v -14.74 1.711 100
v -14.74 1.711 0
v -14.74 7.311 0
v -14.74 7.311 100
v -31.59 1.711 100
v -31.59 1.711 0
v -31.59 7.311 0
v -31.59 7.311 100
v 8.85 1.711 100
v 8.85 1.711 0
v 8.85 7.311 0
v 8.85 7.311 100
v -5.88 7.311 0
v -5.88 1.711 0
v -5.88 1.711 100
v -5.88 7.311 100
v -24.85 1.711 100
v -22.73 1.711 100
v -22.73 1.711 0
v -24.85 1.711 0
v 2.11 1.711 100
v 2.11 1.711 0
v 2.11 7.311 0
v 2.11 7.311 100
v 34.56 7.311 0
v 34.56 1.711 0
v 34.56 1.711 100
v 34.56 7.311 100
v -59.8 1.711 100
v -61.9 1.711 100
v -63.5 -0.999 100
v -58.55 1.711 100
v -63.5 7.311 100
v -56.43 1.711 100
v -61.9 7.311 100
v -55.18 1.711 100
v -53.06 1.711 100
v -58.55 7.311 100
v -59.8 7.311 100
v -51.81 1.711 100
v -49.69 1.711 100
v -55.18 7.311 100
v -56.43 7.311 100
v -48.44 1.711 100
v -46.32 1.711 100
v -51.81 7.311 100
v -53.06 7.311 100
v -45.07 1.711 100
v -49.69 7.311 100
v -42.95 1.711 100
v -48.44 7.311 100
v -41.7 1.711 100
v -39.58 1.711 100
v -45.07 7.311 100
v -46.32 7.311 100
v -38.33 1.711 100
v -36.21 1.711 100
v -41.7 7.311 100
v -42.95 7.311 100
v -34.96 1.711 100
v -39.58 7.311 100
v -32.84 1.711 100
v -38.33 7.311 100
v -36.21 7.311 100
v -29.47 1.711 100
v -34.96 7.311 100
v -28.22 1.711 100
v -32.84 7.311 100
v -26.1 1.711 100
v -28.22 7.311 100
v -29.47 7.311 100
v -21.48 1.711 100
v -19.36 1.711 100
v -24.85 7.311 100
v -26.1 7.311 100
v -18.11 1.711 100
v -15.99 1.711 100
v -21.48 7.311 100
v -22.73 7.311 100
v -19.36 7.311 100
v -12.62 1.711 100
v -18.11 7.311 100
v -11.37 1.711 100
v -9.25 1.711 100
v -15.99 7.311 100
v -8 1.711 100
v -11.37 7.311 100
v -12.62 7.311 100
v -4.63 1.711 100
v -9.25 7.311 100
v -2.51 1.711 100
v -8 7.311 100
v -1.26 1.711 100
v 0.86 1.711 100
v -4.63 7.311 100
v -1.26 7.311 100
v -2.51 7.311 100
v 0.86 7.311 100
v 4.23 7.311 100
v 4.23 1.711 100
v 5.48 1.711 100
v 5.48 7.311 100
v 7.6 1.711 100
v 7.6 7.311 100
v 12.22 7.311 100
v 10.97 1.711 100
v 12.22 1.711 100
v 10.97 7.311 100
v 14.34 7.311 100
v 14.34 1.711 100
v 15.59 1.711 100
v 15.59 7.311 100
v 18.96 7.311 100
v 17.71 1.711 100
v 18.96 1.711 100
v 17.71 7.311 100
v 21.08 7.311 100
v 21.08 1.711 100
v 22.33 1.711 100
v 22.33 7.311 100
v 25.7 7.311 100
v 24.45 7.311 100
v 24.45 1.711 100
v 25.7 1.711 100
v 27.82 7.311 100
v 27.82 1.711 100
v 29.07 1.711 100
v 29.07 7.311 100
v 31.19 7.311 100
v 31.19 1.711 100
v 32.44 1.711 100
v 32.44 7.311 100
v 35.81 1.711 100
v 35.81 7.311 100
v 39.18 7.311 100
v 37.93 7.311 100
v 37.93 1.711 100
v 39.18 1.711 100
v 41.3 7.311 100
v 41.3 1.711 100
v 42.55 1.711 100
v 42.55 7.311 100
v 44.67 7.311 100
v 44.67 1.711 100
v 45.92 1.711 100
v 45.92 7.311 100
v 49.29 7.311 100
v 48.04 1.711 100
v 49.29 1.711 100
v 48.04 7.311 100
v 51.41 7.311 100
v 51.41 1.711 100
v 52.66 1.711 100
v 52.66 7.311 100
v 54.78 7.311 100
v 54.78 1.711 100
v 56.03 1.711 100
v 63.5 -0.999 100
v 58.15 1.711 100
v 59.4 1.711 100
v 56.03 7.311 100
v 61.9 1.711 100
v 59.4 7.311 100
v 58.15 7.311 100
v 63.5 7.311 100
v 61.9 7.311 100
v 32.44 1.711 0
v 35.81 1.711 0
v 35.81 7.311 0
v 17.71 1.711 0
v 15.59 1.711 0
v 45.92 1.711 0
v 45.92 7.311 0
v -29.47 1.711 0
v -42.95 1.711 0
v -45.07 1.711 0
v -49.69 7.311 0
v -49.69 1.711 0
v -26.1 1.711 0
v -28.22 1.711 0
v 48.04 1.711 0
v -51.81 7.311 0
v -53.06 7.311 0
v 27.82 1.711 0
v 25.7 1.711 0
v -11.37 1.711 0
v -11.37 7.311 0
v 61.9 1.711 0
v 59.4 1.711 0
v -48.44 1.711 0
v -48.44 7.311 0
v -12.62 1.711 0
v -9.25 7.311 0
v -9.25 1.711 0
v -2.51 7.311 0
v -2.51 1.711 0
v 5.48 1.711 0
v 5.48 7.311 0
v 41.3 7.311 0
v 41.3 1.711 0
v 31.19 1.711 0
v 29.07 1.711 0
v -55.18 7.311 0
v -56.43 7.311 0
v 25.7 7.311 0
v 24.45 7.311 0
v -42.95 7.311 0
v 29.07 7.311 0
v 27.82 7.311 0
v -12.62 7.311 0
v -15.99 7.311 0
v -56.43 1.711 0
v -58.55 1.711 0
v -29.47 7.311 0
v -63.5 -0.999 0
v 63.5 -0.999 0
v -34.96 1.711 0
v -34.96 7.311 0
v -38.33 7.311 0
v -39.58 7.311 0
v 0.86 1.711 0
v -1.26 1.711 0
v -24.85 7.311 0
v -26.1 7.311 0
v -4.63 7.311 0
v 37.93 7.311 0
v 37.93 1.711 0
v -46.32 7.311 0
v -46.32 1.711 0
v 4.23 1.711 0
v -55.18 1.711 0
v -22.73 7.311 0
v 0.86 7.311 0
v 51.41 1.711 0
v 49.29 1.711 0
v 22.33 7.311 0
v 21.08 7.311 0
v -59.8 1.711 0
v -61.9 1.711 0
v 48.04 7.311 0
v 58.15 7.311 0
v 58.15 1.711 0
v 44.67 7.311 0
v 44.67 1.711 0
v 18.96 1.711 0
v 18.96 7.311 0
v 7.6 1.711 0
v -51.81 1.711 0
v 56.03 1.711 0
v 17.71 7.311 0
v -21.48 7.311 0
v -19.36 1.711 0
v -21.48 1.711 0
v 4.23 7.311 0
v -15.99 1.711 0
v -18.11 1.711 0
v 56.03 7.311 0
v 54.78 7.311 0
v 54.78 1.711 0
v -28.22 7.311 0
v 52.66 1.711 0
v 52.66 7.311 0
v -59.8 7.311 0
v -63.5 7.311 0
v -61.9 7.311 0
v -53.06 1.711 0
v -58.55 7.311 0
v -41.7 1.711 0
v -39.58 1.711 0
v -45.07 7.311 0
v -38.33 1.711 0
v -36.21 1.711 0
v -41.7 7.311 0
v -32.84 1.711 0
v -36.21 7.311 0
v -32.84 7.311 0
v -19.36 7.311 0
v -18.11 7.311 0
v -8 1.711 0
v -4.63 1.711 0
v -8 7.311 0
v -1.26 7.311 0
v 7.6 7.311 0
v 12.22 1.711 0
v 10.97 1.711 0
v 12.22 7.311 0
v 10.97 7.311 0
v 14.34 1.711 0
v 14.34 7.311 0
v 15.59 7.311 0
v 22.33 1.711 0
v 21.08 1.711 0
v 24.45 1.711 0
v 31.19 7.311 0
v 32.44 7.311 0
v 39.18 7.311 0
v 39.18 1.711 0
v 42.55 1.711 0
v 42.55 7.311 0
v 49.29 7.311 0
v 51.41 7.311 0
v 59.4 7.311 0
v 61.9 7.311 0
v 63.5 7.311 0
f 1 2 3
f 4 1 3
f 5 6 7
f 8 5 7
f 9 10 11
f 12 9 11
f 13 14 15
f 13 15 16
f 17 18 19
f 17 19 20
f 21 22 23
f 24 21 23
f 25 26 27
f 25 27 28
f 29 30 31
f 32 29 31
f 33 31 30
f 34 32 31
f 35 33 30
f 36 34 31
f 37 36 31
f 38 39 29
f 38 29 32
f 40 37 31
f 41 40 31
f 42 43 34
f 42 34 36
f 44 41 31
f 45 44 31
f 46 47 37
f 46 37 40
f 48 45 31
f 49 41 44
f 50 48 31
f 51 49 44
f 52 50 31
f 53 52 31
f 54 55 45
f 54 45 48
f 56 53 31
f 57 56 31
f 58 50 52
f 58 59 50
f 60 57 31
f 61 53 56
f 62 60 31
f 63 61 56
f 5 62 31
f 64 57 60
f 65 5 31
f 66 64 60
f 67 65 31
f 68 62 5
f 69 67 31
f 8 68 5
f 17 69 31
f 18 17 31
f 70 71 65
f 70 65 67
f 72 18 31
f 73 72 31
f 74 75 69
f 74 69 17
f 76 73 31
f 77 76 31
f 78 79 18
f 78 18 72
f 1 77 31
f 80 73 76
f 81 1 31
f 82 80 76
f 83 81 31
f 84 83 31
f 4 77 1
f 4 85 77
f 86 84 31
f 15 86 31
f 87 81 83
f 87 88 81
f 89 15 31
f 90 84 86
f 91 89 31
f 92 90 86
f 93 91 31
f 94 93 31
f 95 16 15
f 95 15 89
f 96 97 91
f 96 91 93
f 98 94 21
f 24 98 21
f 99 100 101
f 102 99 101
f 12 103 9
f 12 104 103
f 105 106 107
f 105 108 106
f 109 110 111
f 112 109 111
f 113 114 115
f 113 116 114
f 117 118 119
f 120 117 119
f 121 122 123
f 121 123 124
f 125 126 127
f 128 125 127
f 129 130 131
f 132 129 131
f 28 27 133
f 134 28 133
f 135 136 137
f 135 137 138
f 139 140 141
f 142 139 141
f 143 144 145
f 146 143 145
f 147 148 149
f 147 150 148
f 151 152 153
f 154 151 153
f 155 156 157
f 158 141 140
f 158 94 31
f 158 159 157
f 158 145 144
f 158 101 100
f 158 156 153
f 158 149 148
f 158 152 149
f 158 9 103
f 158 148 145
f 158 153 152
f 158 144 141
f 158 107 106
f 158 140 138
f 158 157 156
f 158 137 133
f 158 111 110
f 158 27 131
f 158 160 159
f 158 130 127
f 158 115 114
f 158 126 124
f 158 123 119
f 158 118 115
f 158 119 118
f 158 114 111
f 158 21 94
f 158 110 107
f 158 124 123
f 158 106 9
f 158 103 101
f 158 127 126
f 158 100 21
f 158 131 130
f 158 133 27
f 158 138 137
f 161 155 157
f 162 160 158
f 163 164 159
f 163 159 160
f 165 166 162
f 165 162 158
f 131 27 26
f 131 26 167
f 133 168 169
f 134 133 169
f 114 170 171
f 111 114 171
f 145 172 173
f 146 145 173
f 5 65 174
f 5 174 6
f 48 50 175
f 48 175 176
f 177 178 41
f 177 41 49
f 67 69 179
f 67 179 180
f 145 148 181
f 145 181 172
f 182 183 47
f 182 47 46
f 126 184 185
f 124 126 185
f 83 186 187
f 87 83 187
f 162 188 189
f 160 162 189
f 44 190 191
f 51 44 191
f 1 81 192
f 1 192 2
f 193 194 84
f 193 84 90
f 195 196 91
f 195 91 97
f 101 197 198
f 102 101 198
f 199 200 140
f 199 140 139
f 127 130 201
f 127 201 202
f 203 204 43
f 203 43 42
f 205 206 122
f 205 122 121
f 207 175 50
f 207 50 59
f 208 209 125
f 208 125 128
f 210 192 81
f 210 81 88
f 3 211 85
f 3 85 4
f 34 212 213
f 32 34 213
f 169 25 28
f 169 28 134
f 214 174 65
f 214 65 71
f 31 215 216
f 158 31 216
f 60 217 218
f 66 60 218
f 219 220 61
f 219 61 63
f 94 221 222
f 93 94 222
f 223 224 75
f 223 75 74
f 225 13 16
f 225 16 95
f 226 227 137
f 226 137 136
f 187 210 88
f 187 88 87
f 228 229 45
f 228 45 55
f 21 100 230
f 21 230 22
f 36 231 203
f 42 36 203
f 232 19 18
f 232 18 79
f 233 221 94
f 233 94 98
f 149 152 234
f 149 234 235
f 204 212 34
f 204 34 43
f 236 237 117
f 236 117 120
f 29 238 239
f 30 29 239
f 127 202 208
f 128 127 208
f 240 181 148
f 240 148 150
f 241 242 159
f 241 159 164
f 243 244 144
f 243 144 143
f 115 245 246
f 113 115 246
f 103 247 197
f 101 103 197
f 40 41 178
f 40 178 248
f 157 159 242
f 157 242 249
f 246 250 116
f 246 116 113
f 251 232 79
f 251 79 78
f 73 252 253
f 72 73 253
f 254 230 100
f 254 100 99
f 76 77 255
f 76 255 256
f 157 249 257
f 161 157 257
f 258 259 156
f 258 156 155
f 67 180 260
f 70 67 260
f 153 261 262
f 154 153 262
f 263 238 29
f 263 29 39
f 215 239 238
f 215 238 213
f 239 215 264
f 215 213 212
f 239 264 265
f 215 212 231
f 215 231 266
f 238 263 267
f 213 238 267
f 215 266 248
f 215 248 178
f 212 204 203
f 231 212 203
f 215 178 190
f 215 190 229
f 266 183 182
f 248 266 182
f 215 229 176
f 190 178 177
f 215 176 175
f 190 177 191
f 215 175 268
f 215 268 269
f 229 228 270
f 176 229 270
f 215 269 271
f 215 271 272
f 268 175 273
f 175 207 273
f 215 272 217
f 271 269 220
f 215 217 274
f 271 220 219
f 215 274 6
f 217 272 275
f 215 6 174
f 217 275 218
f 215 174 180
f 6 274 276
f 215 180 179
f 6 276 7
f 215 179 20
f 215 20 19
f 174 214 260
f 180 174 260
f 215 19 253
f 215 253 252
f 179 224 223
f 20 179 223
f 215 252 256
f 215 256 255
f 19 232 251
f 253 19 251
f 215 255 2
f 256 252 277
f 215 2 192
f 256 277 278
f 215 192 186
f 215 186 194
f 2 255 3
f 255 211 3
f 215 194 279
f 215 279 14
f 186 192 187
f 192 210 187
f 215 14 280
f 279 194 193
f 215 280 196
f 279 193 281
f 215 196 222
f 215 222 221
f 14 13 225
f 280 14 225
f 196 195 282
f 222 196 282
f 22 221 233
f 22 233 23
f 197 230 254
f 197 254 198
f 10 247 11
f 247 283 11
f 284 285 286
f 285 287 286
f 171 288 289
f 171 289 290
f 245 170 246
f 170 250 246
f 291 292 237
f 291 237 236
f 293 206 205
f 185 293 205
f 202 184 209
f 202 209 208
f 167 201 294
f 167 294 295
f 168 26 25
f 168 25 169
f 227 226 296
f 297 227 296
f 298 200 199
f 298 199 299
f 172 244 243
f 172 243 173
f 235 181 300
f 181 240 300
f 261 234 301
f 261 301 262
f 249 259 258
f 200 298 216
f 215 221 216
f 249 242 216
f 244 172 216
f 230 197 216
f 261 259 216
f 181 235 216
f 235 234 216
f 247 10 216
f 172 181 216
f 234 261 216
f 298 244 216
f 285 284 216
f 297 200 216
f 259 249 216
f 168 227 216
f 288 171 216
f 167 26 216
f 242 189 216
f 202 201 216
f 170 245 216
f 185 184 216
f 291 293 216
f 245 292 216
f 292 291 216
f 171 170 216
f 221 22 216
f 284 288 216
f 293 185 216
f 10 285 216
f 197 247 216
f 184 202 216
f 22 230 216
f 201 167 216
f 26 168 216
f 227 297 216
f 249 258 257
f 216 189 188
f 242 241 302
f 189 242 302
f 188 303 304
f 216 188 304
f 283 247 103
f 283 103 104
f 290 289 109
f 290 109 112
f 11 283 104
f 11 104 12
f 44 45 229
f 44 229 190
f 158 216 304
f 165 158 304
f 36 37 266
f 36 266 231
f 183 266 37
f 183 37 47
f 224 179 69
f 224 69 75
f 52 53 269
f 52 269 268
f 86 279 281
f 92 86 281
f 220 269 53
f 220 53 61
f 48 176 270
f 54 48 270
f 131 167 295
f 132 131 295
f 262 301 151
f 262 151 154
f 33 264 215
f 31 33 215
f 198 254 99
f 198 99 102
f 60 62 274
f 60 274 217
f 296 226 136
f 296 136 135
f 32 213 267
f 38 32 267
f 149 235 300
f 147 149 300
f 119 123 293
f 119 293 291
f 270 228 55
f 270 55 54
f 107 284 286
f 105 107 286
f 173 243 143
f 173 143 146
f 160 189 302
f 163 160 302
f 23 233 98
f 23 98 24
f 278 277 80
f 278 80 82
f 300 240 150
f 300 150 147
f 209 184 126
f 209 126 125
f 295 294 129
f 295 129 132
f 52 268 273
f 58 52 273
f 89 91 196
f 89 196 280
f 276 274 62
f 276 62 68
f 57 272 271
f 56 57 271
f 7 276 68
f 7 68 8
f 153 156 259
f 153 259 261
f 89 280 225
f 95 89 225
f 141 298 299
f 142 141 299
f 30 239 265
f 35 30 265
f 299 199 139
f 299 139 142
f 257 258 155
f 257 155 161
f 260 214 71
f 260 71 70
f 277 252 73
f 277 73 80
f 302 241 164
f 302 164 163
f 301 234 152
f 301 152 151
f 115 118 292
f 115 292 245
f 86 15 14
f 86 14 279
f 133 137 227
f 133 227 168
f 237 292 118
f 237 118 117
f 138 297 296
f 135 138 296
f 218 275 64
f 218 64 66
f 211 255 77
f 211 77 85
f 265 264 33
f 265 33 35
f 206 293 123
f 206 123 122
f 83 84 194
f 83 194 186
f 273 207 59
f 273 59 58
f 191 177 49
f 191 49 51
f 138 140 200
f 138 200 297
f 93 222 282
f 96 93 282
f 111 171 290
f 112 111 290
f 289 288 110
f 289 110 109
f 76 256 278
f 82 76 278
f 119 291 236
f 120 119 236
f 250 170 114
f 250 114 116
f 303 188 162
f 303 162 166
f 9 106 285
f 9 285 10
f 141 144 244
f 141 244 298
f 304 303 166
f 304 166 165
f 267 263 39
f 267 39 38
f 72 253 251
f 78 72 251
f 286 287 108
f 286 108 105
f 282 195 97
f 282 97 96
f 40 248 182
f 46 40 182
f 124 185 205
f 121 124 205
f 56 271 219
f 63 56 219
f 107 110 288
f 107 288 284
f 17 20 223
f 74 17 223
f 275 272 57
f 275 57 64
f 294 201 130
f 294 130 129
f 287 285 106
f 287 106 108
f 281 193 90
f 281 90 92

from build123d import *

# Parameters (mm, degrees)
SKETCH_1_W      = 1.6
SKETCH_1_H      = 5.6
SKETCH_1_W_2    = 1.25
EXTRUDE_1_DEPTH = 100


with BuildPart() as part:
    # 草图1 → 凸台-拉伸1 (new body)
    with BuildSketch(Plane.XY):
        Polygon((-63.5, 1.710790235), (-63.5, -0.999209765), (63.5, -0.999209765), (63.5, 1.710790235), (61.9, 1.710790235), (59.4, 1.710790235), (58.15, 1.710790235), (56.03, 1.710790235), (54.78, 1.710790235), (52.66, 1.710790235), (51.41, 1.710790235), (49.29, 1.710790235), (48.04, 1.710790235), (45.92, 1.710790235), (44.67, 1.710790235), (42.55, 1.710790235), (41.3, 1.710790235), (39.18, 1.710790235), (37.93, 1.710790235), (35.81, 1.710790235), (34.56, 1.710790235), (32.44, 1.710790235), (31.19, 1.710790235), (29.07, 1.710790235), (27.82, 1.710790235), (25.7, 1.710790235), (24.45, 1.710790235), (22.33, 1.710790235), (21.08, 1.710790235), (18.96, 1.710790235), (17.71, 1.710790235), (15.59, 1.710790235), (14.34, 1.710790235), (12.22, 1.710790235), (10.97, 1.710790235), (8.85, 1.710790235), (7.6, 1.710790235), (5.48, 1.710790235), (4.23, 1.710790235), (2.11, 1.710790235), (0.86, 1.710790235), (-1.26, 1.710790235), (-2.51, 1.710790235), (-4.63, 1.710790235), (-5.88, 1.710790235), (-8, 1.710790235), (-9.25, 1.710790235), (-11.37, 1.710790235), (-12.62, 1.710790235), (-14.74, 1.710790235), (-15.99, 1.710790235), (-18.11, 1.710790235), (-19.36, 1.710790235), (-21.48, 1.710790235), (-22.73, 1.710790235), (-24.85, 1.710790235), (-26.1, 1.710790235), (-28.22, 1.710790235), (-29.47, 1.710790235), (-31.59, 1.710790235), (-32.84, 1.710790235), (-34.96, 1.710790235), (-36.21, 1.710790235), (-38.33, 1.710790235), (-39.58, 1.710790235), (-41.7, 1.710790235), (-42.95, 1.710790235), (-45.07, 1.710790235), (-46.32, 1.710790235), (-48.44, 1.710790235), (-49.69, 1.710790235), (-51.81, 1.710790235), (-53.06, 1.710790235), (-55.18, 1.710790235), (-56.43, 1.710790235), (-58.55, 1.710790235), (-59.8, 1.710790235), (-61.9, 1.710790235), align=None)
        with Locations((-62.7, 4.510790235)):
            Rectangle(SKETCH_1_W, SKETCH_1_H)
        with Locations((62.7, 4.510790235)):
            Rectangle(SKETCH_1_W, SKETCH_1_H)
        with Locations((-59.175, 4.510790235)):
            Rectangle(SKETCH_1_W_2, SKETCH_1_H)
        with Locations((58.775, 4.510790235)):
            Rectangle(SKETCH_1_W_2, SKETCH_1_H)
        with Locations((-55.805, 4.510790235)):
            Rectangle(SKETCH_1_W_2, SKETCH_1_H)
        with Locations((55.405, 4.510790235)):
            Rectangle(SKETCH_1_W_2, SKETCH_1_H)
        with Locations((-52.435, 4.510790235)):
            Rectangle(SKETCH_1_W_2, SKETCH_1_H)
        with Locations((52.035, 4.510790235)):
            Rectangle(SKETCH_1_W_2, SKETCH_1_H)
        with Locations((-49.065, 4.510790235)):
            Rectangle(SKETCH_1_W_2, SKETCH_1_H)
        with Locations((48.665, 4.510790235)):
            Rectangle(SKETCH_1_W_2, SKETCH_1_H)
        with Locations((-45.695, 4.510790235)):
            Rectangle(SKETCH_1_W_2, SKETCH_1_H)
        with Locations((45.295, 4.510790235)):
            Rectangle(SKETCH_1_W_2, SKETCH_1_H)
        with Locations((-42.325, 4.510790235)):
            Rectangle(SKETCH_1_W_2, SKETCH_1_H)
        with Locations((41.925, 4.510790235)):
            Rectangle(SKETCH_1_W_2, SKETCH_1_H)
        with Locations((-38.955, 4.510790235)):
            Rectangle(SKETCH_1_W_2, SKETCH_1_H)
        with Locations((38.555, 4.510790235)):
            Rectangle(SKETCH_1_W_2, SKETCH_1_H)
        with Locations((-35.585, 4.510790235)):
            Rectangle(SKETCH_1_W_2, SKETCH_1_H)
        with Locations((35.185, 4.510790235)):
            Rectangle(SKETCH_1_W_2, SKETCH_1_H)
        with Locations((-32.215, 4.510790235)):
            Rectangle(SKETCH_1_W_2, SKETCH_1_H)
        with Locations((31.815, 4.510790235)):
            Rectangle(SKETCH_1_W_2, SKETCH_1_H)
        with Locations((-28.845, 4.510790235)):
            Rectangle(SKETCH_1_W_2, SKETCH_1_H)
        with Locations((28.445, 4.510790235)):
            Rectangle(SKETCH_1_W_2, SKETCH_1_H)
        with Locations((-25.475, 4.510790235)):
            Rectangle(SKETCH_1_W_2, SKETCH_1_H)
        with Locations((25.075, 4.510790235)):
            Rectangle(SKETCH_1_W_2, SKETCH_1_H)
        with Locations((-22.105, 4.510790235)):
            Rectangle(SKETCH_1_W_2, SKETCH_1_H)
        with Locations((21.705, 4.510790235)):
            Rectangle(SKETCH_1_W_2, SKETCH_1_H)
        with Locations((-18.735, 4.510790235)):
            Rectangle(SKETCH_1_W_2, SKETCH_1_H)
        with Locations((18.335, 4.510790235)):
            Rectangle(SKETCH_1_W_2, SKETCH_1_H)
        with Locations((-15.365, 4.510790235)):
            Rectangle(SKETCH_1_W_2, SKETCH_1_H)
        with Locations((14.965, 4.510790235)):
            Rectangle(SKETCH_1_W_2, SKETCH_1_H)
        with Locations((-11.995, 4.510790235)):
            Rectangle(SKETCH_1_W_2, SKETCH_1_H)
        with Locations((11.595, 4.510790235)):
            Rectangle(SKETCH_1_W_2, SKETCH_1_H)
        with Locations((-8.625, 4.510790235)):
            Rectangle(SKETCH_1_W_2, SKETCH_1_H)
        with Locations((8.225, 4.510790235)):
            Rectangle(SKETCH_1_W_2, SKETCH_1_H)
        with Locations((-5.255, 4.510790235)):
            Rectangle(SKETCH_1_W_2, SKETCH_1_H)
        with Locations((4.855, 4.510790235)):
            Rectangle(SKETCH_1_W_2, SKETCH_1_H)
        with Locations((-1.885, 4.510790235)):
            Rectangle(SKETCH_1_W_2, SKETCH_1_H)
        with Locations((1.485, 4.510790235)):
            Rectangle(SKETCH_1_W_2, SKETCH_1_H)
    extrude(amount=EXTRUDE_1_DEPTH)


solid = part.part
